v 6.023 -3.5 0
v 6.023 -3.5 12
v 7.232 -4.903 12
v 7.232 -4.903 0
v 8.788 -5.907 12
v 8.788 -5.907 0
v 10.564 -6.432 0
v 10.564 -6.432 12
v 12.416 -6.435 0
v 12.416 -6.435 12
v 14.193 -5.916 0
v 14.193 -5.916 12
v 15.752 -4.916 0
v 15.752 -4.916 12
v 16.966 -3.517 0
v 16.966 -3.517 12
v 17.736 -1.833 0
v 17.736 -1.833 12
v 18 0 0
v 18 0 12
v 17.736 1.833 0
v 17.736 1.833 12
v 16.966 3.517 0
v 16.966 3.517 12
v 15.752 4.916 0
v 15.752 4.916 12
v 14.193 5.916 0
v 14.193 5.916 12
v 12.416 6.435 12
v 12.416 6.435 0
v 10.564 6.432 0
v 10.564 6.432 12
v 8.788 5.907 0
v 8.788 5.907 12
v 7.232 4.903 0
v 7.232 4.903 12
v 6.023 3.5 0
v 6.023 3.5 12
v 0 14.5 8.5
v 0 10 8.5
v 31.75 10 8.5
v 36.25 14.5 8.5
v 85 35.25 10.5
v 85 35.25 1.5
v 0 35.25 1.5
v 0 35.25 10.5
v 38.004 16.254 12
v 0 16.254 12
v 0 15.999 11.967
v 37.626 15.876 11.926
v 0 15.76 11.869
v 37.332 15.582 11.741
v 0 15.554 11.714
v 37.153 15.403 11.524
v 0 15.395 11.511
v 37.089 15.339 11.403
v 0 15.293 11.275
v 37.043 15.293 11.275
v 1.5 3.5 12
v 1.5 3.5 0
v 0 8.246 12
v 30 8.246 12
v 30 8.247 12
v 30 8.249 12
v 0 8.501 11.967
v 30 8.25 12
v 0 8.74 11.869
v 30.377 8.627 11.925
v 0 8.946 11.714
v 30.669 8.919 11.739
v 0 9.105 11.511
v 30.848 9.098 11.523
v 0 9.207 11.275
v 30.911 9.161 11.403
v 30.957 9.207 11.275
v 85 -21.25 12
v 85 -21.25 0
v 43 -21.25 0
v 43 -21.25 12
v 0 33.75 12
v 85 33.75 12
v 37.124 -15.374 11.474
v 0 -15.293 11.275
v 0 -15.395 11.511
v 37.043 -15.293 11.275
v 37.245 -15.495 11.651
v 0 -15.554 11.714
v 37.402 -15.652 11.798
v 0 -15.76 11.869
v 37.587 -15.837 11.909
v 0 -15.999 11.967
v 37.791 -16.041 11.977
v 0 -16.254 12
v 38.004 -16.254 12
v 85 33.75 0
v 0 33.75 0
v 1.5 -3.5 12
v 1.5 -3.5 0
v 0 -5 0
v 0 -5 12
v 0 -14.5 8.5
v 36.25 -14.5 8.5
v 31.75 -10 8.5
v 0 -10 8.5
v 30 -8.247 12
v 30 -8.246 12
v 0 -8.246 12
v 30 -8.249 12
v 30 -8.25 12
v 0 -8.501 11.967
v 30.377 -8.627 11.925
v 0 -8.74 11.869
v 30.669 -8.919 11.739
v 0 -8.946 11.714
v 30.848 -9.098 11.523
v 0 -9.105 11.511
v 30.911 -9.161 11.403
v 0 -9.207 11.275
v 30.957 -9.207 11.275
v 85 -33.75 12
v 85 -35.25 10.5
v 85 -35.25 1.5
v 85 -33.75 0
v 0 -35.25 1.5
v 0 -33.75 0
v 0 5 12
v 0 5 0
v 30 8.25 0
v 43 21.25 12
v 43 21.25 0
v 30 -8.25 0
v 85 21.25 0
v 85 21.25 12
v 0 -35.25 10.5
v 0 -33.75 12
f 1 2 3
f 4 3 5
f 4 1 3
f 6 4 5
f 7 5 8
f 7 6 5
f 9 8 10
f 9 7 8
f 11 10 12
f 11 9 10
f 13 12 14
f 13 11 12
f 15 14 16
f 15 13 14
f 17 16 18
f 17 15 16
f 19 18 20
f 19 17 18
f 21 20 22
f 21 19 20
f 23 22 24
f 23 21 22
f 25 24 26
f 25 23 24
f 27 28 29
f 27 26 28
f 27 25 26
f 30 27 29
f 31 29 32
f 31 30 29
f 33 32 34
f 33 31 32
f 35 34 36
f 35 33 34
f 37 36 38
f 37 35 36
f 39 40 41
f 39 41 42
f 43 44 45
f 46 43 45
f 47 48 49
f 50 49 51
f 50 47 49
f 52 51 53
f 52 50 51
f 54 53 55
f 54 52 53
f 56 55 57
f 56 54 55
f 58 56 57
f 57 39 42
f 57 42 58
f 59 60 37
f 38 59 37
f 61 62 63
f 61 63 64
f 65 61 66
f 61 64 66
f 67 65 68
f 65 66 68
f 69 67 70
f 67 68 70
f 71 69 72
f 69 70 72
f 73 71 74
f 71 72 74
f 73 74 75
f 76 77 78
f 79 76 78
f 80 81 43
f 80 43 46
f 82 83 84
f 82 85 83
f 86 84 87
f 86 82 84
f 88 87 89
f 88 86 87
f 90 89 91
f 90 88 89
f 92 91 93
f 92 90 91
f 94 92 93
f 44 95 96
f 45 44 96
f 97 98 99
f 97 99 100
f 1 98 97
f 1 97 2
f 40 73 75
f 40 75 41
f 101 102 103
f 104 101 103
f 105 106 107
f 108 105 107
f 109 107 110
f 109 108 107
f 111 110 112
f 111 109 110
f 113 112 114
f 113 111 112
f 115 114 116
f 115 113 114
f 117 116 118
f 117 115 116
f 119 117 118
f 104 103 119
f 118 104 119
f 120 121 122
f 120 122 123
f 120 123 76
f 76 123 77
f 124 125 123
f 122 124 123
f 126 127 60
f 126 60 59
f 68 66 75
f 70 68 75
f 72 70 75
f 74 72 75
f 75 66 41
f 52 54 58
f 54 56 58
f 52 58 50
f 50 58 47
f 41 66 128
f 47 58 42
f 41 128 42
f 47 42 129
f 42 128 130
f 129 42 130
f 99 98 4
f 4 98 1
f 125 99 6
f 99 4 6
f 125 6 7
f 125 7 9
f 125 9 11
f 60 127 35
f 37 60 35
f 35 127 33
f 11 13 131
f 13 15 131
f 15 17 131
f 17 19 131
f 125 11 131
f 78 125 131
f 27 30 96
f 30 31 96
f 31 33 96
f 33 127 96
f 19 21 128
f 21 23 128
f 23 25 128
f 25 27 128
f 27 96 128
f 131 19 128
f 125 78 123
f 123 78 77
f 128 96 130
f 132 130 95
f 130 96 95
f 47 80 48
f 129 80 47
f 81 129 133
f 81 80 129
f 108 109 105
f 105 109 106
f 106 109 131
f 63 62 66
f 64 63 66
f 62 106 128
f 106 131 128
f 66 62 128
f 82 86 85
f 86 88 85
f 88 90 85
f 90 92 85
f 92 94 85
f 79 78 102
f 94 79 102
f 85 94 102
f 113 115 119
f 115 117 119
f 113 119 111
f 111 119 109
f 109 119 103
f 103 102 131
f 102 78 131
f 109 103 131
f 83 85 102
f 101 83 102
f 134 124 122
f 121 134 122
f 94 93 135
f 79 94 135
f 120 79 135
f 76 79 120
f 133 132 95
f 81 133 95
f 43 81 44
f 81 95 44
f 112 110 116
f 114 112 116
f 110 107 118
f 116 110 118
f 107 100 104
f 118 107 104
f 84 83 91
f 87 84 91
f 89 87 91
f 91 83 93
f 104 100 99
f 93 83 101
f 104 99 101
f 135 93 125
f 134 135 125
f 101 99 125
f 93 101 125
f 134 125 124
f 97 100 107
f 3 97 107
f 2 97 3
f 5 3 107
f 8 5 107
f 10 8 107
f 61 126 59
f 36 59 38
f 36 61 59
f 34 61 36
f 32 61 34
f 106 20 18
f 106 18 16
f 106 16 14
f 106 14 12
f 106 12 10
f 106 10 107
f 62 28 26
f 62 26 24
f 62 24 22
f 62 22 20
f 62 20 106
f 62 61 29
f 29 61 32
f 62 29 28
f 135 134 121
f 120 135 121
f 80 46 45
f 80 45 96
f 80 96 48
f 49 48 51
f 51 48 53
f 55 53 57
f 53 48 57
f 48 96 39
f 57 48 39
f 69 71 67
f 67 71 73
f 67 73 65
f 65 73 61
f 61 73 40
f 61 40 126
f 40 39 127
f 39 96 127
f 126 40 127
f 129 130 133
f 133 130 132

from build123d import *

# Parameters (mm, degrees)
F1_DEPTH = 12
F2_W     = 8
F2_H     = 7
F3_DEPTH = 12
F4_R     = 6.5
F5_DEPTH = 12
F6_SIZE  = 1.5
F8_DEPTH = 40
F9_R     = 1


with BuildPart() as f1:
    # F0 (on Top) → F1 (new body)
    with BuildSketch(Plane.XY):
        Polygon((85, 35.25), (0, 35.25), (0, -35.25), (85, -35.25), (85, -21.25), (43, -21.25), (30, -8.25), (30, 8.25), (43, 21.25), (85, 21.25), align=None)
    extrude(amount=F1_DEPTH)

    # F2 (on Top) → F3 (cut)
    with BuildSketch(Plane.XY):
        with Locations((4, 0)):
            Rectangle(F2_W, F2_H)
    extrude(amount=F3_DEPTH, mode=Mode.SUBTRACT)

    # F4 (on Top) → F5 (cut)
    with BuildSketch(Plane.XY):
        with Locations((11.5, 0)):
            Circle(F4_R)
    extrude(amount=F5_DEPTH, mode=Mode.SUBTRACT)

    # F6
    f6_edges = [f1.edges().sort_by_distance(p)[0] for p in [
        (42.5, -35.25, 12),
        (42.5, 35.25, 12),
        (42.5, -35.25, 0),
        (42.5, 35.25, 0),
        (0, 3.5, 6),
        (0, -3.5, 6),
    ]]
    chamfer(f6_edges, length=F6_SIZE)

    # F7 (on Right) → F8 (cut)
    with BuildSketch(Plane.YZ):
        Polygon((-10, 8.5), (-9, 12), (-15.5, 12), (-14.5, 8.5), align=None)
        Polygon((14.5, 8.5), (15.5, 12), (9, 12), (10, 8.5), align=None)
    extrude(amount=F8_DEPTH, mode=Mode.SUBTRACT)

    # F9
    f9_edges = [f1.edges().sort_by_distance(p)[0] for p in [
        (18.625, 15.5, 12),
        (18.625, -15.5, 12),
        (15.375, -9, 12),
        (15.375, 9, 12),
    ]]
    fillet(f9_edges, radius=F9_R)


solid = f1.part
